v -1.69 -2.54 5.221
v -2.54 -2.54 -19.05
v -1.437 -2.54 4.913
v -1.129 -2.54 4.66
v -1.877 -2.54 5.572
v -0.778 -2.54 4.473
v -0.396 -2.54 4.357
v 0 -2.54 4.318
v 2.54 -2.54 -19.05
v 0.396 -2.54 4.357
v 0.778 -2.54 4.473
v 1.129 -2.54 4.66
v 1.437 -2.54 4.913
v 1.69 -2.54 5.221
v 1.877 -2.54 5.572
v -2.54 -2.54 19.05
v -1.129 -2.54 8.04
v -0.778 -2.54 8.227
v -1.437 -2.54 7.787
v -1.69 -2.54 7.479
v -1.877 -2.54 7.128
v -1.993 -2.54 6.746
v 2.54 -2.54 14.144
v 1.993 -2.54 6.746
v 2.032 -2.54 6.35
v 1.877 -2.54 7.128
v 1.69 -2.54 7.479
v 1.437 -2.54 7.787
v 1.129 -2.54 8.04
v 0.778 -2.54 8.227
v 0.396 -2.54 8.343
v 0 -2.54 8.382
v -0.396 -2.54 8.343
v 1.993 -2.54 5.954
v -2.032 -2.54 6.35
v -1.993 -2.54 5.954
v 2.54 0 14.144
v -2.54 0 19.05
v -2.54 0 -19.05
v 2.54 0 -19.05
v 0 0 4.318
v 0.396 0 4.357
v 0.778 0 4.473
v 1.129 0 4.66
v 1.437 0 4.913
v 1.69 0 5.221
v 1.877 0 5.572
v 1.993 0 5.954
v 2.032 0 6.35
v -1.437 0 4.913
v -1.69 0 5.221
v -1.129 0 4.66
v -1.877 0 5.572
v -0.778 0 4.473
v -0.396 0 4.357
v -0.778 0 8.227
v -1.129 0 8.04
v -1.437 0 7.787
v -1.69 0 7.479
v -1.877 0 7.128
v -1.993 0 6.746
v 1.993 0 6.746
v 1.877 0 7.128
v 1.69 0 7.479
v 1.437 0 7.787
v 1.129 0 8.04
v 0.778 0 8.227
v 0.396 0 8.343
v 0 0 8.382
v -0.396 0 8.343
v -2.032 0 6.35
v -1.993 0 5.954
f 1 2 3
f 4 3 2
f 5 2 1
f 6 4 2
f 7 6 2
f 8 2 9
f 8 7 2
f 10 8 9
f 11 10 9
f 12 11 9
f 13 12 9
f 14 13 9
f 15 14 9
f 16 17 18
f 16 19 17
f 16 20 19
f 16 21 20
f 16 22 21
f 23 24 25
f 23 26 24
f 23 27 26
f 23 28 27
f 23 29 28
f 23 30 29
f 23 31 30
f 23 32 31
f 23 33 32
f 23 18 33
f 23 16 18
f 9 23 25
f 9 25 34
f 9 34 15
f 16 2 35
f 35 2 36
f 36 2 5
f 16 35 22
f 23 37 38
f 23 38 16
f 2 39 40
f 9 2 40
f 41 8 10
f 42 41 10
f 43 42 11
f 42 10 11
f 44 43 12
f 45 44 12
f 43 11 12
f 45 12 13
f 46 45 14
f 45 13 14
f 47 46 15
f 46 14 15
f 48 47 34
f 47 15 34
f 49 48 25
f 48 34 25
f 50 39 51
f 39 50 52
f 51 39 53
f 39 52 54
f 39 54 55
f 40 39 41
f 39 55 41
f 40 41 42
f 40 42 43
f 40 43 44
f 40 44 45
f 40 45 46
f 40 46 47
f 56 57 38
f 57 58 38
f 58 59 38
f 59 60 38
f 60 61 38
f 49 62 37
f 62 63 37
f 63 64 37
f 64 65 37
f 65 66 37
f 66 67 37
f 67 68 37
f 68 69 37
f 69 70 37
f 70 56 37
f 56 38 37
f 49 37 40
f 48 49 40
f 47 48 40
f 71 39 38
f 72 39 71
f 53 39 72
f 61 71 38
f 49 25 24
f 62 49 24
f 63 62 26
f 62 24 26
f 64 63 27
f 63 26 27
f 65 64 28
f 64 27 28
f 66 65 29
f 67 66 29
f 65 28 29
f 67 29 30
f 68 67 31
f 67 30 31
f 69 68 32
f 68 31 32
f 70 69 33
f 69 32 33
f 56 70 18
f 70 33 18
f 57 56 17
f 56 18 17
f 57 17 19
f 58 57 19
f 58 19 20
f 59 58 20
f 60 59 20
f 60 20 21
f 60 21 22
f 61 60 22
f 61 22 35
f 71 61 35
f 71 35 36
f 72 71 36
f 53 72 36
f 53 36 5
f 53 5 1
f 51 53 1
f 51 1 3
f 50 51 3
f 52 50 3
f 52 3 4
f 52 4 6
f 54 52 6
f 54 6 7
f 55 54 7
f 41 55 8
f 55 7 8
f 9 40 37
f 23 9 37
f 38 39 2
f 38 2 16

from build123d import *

# Parameters (mm, degrees)
F0_W     = 5.08
F0_H     = 38.1
F1_DEPTH = 2.54
F2_SIZE2 = 4.905689
F2_SIZE  = 5.07999
F4_DEPTH = 25.4


# Not quite as in the source:
# - a fillet or chamfer is up to 0.001 mm smaller than in the source, because OpenCascade refuses the exact size


with BuildPart() as f1:
    # F0 (on Front) → F1 (new body)
    with BuildSketch(Plane.XZ):
        Rectangle(F0_W, F0_H)
    extrude(amount=F1_DEPTH)

    # F2 (size 5.08 and 4.905698976 in the source; OpenCascade refuses exactly that, so slightly less here)
    f2_edges = [f1.edges().sort_by_distance(p)[0] for p in [
        (2.54, -1.27, 19.05),
    ]]
    f2_side = f1.faces().sort_by_distance((0, -1.27, 19.05))[0]
    chamfer(f2_edges, length=F2_SIZE, length2=F2_SIZE2, reference=f2_side)

    # F3 (on face) → F4 (cut)
    with BuildSketch(Plane.XZ.offset(2.54)):
        with BuildLine():
            ThreePointArc((0, 4.318), (1.4368409794, 4.9131590206), (2.032, 6.35))
            ThreePointArc((2.032, 6.35), (-1.4368409794, 7.7868409794), (0, 4.318))
        make_face()
    extrude(amount=-F4_DEPTH, mode=Mode.SUBTRACT)


solid = f1.part
